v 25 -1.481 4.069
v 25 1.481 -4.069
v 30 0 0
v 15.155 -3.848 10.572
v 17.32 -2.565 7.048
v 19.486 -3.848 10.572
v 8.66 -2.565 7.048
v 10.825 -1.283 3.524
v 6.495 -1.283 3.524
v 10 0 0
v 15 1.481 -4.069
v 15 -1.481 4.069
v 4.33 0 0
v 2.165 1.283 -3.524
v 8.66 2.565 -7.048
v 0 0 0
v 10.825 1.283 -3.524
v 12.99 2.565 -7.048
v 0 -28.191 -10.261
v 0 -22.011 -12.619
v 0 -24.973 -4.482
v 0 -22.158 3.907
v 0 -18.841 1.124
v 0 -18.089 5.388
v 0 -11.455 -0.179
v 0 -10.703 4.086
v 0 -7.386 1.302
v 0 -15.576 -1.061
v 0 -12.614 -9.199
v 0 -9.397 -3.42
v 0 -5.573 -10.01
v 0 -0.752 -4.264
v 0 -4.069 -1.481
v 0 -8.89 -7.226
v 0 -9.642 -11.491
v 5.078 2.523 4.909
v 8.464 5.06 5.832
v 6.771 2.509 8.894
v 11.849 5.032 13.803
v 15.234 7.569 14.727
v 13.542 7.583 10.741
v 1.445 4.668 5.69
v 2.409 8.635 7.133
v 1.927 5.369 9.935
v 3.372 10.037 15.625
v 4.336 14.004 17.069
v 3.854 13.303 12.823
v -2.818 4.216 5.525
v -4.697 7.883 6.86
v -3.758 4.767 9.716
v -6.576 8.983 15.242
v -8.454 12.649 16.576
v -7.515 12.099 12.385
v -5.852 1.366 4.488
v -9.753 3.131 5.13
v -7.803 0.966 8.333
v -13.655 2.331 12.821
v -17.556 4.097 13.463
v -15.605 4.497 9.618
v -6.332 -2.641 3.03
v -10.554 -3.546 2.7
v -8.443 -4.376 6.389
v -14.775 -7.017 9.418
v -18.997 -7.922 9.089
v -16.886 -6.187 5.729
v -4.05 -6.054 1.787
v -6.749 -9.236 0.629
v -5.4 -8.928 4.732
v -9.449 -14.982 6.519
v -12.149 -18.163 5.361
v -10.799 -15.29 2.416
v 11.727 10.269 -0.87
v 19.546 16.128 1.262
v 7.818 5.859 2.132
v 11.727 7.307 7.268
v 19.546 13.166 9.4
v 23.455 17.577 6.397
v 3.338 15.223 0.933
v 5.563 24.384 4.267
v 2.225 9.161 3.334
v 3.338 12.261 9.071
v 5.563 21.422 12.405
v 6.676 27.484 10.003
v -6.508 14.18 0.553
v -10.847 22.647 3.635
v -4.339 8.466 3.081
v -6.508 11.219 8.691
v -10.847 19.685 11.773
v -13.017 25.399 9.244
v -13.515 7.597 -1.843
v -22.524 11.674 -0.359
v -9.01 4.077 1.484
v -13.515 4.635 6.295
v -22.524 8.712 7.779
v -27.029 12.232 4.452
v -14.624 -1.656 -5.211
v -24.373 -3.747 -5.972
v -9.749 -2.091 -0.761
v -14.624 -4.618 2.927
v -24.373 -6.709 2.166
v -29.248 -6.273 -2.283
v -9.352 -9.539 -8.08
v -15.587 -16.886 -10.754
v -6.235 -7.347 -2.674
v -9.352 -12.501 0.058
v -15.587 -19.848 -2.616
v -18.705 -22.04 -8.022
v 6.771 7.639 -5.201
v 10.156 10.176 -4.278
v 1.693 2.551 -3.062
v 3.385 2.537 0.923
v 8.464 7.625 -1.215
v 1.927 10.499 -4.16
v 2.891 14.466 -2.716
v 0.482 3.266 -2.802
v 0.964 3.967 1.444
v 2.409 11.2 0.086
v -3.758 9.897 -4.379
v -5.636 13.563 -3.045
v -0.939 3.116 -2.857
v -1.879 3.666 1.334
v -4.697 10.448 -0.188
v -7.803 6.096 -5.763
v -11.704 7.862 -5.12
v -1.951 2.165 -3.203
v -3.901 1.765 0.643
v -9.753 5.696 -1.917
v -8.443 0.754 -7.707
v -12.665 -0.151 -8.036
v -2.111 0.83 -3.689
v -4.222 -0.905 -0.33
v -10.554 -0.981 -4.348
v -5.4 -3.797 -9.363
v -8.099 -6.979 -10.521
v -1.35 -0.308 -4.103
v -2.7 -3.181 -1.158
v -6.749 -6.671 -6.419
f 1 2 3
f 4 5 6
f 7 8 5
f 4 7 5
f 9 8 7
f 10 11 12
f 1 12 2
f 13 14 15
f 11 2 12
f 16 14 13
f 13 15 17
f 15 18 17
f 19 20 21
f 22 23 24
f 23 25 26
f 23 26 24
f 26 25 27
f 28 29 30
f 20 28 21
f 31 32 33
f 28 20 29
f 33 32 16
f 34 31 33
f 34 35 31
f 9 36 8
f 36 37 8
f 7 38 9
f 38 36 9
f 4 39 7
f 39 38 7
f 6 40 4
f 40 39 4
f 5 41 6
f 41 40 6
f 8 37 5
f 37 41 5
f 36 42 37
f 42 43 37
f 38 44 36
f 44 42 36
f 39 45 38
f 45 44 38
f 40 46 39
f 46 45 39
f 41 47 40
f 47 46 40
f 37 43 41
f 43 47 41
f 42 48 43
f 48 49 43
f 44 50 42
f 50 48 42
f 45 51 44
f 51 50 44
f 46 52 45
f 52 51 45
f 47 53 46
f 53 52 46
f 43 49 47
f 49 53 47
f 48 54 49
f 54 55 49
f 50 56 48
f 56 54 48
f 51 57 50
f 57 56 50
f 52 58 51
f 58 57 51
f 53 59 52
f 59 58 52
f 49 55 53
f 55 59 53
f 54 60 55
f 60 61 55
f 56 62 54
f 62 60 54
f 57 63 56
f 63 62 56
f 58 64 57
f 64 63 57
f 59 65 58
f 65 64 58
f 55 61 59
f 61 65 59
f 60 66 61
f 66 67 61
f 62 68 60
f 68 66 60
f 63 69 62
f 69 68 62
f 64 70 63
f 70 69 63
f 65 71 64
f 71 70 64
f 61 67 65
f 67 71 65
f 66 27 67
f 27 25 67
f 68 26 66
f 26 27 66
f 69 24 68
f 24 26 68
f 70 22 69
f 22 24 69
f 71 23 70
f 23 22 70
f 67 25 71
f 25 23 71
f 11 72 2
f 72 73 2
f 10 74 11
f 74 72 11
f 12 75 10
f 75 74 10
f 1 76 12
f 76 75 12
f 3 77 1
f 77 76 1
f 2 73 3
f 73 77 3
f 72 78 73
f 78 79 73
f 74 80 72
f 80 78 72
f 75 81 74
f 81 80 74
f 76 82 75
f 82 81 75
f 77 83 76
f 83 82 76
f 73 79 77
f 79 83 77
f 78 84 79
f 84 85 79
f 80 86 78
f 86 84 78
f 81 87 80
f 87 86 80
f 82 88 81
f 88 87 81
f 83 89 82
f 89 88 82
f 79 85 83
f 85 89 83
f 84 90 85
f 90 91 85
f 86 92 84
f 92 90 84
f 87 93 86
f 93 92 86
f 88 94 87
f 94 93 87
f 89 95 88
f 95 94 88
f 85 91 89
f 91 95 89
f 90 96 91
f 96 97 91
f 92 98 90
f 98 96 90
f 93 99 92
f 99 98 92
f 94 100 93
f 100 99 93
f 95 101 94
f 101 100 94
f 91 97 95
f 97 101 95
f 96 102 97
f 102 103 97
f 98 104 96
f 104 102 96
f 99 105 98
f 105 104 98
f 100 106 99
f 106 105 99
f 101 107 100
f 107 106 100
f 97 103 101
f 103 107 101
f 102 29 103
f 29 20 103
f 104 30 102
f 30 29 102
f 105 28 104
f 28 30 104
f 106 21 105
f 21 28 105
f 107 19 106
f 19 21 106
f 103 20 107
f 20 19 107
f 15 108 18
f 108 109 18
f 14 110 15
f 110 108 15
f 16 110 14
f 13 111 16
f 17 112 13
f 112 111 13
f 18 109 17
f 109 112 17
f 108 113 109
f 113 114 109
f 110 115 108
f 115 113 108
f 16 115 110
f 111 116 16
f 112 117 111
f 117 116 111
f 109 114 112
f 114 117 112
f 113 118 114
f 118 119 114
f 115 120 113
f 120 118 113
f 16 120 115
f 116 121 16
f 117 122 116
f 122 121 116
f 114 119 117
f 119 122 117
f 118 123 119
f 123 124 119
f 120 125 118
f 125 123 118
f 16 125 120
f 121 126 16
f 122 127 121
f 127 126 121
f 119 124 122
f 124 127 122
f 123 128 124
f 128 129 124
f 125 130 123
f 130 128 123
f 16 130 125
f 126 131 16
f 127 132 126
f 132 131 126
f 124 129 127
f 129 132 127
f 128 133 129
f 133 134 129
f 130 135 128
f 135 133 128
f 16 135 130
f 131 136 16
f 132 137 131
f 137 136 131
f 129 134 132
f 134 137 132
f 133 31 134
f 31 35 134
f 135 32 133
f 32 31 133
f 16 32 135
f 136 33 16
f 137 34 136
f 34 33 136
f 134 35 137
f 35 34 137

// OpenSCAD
rotate([20,0,0])
rotate_extrude($fn = 10, angle=270) {
   rotate([0,0,30]) translate([15,0,0]) scale([1.5,0.5]) circle(5, $fn=6);
   translate([20,0,0]) scale([2,1]) circle(5, $fn = 6);
   rotate([0,0,-30]) translate([7.5,0,0]) scale([1.5,0.5]) circle(5, $fn=6);
}
